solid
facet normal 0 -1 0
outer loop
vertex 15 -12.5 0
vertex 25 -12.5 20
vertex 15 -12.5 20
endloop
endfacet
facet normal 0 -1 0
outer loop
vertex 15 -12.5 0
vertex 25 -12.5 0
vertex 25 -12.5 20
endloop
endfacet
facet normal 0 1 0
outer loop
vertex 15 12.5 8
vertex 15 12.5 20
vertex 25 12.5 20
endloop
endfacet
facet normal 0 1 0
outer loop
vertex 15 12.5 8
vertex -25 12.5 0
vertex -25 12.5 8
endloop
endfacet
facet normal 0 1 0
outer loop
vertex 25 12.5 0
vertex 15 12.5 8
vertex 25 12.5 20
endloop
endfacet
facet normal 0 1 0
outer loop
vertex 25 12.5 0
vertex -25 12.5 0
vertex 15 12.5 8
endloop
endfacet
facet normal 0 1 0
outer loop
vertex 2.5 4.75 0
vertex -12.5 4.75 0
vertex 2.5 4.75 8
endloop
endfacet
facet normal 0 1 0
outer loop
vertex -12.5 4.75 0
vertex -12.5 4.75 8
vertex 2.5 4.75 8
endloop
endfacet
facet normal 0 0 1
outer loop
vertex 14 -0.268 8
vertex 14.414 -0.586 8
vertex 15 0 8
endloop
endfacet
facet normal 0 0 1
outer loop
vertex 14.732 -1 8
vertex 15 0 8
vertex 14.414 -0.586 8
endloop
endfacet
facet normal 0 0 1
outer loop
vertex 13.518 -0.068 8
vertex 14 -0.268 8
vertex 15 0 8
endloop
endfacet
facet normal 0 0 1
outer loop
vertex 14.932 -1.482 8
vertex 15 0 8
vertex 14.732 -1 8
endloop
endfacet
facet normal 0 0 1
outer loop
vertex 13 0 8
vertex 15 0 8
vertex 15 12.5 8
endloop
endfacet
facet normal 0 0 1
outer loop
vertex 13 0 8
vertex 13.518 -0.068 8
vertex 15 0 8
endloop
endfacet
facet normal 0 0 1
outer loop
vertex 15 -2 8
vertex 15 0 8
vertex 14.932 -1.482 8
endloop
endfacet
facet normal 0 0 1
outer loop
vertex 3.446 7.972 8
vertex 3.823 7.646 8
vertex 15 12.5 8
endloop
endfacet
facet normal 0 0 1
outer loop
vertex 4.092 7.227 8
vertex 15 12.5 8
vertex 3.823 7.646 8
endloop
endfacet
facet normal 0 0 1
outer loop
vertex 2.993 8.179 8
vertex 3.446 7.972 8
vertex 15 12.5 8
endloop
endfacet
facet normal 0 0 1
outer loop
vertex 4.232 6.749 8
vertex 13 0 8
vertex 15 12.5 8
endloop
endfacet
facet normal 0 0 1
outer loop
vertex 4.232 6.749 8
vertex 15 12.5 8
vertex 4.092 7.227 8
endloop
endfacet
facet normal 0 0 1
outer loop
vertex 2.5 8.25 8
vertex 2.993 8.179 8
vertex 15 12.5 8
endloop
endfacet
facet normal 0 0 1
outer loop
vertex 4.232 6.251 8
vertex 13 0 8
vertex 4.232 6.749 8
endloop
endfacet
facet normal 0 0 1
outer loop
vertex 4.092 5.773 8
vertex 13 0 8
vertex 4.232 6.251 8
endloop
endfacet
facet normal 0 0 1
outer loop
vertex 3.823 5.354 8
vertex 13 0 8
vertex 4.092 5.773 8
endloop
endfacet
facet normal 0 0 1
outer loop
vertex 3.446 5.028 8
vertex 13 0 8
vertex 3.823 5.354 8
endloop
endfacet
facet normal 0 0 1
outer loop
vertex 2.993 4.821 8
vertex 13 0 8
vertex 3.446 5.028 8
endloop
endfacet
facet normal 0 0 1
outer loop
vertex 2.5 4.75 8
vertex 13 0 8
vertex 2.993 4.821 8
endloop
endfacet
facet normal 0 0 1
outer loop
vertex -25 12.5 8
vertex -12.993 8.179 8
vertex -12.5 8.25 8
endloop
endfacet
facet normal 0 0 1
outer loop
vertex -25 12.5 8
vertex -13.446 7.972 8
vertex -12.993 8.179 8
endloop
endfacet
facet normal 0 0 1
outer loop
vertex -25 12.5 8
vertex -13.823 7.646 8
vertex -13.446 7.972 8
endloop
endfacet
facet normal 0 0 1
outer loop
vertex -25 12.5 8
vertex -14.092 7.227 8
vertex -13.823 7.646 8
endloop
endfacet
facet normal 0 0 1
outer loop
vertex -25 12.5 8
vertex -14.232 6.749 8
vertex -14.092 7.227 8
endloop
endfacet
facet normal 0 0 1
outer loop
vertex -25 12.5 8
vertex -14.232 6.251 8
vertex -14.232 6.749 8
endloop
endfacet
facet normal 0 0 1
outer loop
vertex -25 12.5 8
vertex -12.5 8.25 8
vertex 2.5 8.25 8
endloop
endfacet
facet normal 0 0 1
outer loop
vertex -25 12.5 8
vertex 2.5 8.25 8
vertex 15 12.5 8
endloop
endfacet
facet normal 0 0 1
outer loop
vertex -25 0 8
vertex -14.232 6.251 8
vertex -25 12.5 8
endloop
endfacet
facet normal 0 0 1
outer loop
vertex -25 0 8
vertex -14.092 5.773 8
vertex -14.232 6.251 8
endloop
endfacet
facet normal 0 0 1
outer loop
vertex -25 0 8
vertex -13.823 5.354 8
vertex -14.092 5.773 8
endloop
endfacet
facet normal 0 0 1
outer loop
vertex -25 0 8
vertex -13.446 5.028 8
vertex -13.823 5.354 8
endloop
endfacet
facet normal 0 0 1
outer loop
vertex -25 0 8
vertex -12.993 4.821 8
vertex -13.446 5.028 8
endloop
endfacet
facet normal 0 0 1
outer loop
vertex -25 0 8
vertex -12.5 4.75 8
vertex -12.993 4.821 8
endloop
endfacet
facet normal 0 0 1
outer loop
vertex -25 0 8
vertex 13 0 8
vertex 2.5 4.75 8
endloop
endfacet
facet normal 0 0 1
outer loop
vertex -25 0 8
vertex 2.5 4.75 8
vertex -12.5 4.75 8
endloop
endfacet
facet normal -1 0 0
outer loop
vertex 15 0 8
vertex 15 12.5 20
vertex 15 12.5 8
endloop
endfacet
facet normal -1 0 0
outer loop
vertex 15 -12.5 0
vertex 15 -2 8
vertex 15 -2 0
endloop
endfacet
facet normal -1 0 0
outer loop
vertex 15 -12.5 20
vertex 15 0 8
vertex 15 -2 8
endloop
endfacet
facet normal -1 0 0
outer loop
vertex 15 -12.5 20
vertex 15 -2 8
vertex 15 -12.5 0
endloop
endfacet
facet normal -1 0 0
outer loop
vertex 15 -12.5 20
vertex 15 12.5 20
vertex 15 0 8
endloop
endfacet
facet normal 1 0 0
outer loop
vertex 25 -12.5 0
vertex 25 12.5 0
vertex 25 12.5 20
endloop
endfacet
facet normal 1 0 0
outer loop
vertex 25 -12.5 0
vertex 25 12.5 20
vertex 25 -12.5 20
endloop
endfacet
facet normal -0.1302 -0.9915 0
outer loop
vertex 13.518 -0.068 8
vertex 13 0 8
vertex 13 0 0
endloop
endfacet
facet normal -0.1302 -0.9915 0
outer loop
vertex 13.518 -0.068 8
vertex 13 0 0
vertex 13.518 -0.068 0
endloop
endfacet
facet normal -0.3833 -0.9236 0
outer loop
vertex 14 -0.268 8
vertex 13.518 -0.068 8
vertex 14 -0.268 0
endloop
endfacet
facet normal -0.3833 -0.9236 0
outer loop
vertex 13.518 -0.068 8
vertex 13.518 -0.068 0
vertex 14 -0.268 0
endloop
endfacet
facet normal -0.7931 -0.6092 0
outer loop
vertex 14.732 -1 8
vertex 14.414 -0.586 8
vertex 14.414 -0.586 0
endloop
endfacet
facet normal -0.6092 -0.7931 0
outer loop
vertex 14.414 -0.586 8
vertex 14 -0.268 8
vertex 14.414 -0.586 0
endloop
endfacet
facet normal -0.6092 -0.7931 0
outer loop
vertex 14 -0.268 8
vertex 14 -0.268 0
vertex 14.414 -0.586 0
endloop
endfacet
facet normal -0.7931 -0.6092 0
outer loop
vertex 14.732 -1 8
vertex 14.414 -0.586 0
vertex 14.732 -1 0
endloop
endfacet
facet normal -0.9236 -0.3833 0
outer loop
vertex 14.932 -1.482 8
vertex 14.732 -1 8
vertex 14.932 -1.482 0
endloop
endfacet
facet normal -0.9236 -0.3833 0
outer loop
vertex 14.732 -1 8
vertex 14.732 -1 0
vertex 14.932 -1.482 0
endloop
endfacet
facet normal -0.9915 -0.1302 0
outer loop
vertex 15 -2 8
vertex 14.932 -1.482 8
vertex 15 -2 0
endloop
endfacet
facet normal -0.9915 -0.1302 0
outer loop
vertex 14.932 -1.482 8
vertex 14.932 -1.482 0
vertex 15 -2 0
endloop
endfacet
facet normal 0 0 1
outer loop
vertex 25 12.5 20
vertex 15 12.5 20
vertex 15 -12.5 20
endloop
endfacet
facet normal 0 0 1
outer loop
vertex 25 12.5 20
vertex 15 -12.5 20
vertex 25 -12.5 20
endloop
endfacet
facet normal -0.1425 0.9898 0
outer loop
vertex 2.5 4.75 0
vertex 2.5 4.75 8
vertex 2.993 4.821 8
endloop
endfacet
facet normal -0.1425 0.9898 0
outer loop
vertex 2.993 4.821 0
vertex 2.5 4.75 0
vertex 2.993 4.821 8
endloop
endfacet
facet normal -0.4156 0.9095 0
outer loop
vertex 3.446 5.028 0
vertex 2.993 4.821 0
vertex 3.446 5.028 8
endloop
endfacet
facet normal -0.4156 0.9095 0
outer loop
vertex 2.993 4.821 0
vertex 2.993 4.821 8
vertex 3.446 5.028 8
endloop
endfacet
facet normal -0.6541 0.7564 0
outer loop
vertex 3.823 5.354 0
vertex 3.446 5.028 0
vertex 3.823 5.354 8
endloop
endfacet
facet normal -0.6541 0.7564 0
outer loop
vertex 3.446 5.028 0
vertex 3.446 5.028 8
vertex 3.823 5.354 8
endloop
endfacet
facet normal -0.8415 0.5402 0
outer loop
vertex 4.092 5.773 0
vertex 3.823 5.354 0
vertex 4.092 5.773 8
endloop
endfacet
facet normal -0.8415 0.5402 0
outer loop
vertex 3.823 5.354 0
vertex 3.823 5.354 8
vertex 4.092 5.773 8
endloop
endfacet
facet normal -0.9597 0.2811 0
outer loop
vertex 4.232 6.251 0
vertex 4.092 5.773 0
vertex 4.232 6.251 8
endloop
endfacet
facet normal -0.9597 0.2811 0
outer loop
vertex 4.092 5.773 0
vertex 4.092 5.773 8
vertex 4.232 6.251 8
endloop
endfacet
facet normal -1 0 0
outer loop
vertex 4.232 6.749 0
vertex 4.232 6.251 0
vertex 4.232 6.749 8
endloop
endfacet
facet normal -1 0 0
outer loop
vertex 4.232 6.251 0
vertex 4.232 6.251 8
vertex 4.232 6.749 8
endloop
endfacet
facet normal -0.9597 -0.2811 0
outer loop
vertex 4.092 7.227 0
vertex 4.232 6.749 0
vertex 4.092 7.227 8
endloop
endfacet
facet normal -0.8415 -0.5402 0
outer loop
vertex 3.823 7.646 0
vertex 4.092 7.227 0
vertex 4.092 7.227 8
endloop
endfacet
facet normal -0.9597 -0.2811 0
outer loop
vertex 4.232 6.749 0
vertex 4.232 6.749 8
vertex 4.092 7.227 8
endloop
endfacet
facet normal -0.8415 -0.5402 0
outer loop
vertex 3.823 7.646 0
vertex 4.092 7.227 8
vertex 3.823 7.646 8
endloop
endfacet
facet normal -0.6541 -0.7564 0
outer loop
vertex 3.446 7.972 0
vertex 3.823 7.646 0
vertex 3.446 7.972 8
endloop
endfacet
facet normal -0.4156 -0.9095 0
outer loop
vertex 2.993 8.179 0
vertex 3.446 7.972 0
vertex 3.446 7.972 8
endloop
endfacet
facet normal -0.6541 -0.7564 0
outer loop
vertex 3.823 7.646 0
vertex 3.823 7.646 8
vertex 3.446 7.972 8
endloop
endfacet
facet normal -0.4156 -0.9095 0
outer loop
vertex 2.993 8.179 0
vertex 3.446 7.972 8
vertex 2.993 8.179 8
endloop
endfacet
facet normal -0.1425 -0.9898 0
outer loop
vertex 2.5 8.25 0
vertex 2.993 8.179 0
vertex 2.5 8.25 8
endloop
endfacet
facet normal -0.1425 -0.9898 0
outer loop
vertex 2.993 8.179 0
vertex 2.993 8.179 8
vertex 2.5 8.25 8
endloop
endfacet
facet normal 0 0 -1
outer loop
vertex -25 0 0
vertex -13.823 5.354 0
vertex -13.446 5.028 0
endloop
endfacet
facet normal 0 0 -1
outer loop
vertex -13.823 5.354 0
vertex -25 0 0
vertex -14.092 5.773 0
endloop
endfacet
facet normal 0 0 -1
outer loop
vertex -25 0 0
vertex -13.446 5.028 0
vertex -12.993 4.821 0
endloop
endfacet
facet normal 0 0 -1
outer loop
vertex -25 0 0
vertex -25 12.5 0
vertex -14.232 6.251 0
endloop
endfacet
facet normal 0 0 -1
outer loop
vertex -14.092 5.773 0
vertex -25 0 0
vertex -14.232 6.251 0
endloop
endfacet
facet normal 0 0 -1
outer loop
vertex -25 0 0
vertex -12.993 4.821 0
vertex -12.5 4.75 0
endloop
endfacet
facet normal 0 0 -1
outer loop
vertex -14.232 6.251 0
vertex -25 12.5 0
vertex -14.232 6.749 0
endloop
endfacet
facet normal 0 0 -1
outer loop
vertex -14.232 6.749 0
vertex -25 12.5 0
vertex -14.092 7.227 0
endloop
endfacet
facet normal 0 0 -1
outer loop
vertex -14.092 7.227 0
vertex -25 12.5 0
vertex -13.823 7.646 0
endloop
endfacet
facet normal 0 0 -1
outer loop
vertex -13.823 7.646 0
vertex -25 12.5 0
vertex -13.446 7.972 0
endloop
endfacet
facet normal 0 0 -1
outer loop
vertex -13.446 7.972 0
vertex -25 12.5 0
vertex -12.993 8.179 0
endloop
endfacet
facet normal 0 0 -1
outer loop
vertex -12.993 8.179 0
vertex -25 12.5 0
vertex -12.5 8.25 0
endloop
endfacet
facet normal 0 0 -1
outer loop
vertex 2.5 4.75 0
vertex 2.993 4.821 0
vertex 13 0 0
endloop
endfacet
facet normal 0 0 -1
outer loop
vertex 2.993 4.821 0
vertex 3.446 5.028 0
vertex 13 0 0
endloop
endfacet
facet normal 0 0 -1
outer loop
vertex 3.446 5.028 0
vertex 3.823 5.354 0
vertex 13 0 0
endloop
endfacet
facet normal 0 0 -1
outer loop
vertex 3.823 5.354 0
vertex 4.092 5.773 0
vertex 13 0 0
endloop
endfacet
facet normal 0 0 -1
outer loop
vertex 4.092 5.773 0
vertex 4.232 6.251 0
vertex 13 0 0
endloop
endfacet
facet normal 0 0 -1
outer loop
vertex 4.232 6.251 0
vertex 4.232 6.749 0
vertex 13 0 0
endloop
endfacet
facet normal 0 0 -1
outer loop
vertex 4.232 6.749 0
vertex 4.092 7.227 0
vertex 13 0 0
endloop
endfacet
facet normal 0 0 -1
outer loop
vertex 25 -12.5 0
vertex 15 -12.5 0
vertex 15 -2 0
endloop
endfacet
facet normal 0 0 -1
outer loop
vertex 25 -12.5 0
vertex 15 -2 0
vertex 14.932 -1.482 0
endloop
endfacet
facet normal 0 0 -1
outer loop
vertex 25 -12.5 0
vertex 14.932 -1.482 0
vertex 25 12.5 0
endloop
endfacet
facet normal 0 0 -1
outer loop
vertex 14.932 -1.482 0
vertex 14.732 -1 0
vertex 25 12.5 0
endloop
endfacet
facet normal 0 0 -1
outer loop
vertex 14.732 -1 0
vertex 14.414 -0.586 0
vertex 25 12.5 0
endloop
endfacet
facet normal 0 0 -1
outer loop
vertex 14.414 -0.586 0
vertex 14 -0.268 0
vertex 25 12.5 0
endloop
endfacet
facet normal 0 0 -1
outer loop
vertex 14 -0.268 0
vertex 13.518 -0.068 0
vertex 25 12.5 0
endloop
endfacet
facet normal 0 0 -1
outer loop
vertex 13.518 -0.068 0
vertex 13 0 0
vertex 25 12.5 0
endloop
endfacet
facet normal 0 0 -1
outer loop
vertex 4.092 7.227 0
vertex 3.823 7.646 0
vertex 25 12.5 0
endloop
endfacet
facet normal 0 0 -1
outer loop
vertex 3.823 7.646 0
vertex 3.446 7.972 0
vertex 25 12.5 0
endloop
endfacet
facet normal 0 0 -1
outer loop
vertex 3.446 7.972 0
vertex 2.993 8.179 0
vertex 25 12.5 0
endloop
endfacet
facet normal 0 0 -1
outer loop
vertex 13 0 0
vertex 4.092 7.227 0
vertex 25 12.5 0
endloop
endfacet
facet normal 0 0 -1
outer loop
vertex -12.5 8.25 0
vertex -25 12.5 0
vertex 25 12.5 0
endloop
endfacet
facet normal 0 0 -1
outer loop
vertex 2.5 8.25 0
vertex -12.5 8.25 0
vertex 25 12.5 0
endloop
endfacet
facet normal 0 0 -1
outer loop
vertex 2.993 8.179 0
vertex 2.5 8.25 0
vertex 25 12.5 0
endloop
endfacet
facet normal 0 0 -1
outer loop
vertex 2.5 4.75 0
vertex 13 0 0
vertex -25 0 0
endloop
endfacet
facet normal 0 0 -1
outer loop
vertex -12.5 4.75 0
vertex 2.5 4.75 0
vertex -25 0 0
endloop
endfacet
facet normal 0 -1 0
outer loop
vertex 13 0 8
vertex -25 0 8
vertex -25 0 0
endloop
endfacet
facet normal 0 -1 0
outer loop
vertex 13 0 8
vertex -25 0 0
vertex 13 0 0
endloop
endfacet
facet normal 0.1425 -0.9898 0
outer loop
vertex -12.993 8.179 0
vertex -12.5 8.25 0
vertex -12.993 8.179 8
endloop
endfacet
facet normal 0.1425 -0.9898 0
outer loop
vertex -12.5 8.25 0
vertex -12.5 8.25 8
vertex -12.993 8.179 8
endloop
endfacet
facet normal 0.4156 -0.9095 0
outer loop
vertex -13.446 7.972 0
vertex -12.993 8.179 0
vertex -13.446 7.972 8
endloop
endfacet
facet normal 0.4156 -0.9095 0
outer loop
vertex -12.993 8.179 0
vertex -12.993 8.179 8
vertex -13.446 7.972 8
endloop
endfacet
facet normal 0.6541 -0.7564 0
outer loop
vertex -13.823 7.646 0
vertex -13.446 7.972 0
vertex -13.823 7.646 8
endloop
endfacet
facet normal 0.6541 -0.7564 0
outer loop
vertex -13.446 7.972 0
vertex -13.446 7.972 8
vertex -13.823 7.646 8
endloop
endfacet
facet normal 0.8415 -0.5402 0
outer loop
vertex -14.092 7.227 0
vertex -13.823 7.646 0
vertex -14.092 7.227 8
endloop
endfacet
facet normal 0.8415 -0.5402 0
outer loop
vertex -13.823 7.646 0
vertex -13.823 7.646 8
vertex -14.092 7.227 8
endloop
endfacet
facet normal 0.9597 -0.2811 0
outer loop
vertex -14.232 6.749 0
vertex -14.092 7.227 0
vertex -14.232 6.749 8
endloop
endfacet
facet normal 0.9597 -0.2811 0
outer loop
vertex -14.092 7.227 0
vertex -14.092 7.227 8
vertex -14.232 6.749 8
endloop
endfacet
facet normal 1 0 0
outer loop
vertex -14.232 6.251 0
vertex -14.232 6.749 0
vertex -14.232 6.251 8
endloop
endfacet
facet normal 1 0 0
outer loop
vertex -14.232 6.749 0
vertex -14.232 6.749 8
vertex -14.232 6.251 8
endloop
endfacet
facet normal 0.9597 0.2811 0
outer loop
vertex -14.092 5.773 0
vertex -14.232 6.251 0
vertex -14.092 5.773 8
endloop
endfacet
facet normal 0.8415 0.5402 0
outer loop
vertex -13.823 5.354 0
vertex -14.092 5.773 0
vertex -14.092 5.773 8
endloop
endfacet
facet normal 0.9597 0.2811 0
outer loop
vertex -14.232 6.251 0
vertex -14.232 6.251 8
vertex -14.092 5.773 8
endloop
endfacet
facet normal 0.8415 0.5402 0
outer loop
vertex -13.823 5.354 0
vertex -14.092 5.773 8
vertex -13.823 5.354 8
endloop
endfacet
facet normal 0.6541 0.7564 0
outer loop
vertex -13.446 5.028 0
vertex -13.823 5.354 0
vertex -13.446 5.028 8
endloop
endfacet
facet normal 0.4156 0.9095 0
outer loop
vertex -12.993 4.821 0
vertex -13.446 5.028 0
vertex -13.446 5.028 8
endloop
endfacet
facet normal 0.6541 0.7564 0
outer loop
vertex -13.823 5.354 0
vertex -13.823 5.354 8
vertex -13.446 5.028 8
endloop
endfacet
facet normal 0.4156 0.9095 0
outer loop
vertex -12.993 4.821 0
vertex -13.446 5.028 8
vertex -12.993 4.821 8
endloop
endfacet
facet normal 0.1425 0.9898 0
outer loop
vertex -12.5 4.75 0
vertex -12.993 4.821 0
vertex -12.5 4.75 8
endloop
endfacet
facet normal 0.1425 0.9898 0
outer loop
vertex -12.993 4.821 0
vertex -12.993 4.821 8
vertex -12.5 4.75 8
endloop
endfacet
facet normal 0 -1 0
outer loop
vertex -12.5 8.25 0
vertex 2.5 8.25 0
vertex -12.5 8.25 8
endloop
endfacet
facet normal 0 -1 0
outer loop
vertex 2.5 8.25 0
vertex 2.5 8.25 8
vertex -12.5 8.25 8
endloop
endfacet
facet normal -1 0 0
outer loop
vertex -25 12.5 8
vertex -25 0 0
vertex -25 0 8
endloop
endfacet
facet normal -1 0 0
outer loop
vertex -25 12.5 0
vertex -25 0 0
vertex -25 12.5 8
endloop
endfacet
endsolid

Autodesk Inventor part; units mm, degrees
ref_plane "YZ Plane" through (0, 0, 0) normal (1, 0, 0) x (0, 1, 0)
ref_plane "XZ Plane" through (0, 0, 0) normal (0, 1, 0) x (-1, 0, 0)
ref_plane "XY Plane" through (0, 0, 0) normal (0, 0, 1) x (1, 0, 0)
sketch "Sketch1" plane through (0, 0, 0) normal (0, 0, 1) x (1, 0, 0)
  line L0 (-25, 12.5) -> (25, 12.5)
  line L1 (25, 12.5) -> (25, -12.5)
  line L2 (25, -12.5) -> (-25, -12.5)
  line L3 (-25, -12.5) -> (-25, 12.5)
  point P0 (0, 0)
  point P1 (0, 12.5)
  point P2 (-25, 0)
  dimension "d0" = 50
  dimension "d1" = 25
extrude "Extrusion1" add sketch "Sketch1" along normal blind 20
sketch "Sketch5" plane through (0, 0, 20) normal (0, 0, 1) x (1, 0, 0)
  line L0 (2.5, 8.5) -> (-12.5, 8.5) construction
  line L1 (2.5, 10.25) -> (-12.5, 10.25)
  line L2 (-12.5, 6.75) -> (2.5, 6.75)
  arc A0 (2.5, 6.75) -> (2.5, 10.25) centre (2.5, 8.5) ccw
  arc A1 (-12.5, 10.25) -> (-12.5, 6.75) centre (-12.5, 8.5) ccw
  line L3 (2.5, -6.5) -> (-12.5, -6.5) construction
  line L4 (2.5, -4.75) -> (-12.5, -4.75)
  line L5 (-12.5, -8.25) -> (2.5, -8.25)
  arc A2 (2.5, -8.25) -> (2.5, -4.75) centre (2.5, -6.5) ccw
  arc A3 (-12.5, -4.75) -> (-12.5, -8.25) centre (-12.5, -6.5) ccw
  line L6 (25, 12.5) -> (-25, 12.5) projected
  line L7 (-25, -12.5) -> (25, -12.5) projected
  line L8 (-25, 12.5) -> (-25, -12.5) projected
  point P0 (0, 0)
  point P1 (-5, 8.5)
  point P2 (-5, -6.5)
  dimension "d29" = 3.5
  dimension "d30" = 4
  dimension "d31" = 6
  dimension "d32" = 20
  dimension "d33" = 15
extrude "Extrusion5" cut sketch "Sketch5" against normal through all contours A2 L5 A3 L4
sketch "Sketch6" plane through (0, 0, 20) normal (0, 0, 1) x (1, 0, 0)
  line L0 (15, 0) -> (-25, 0)
  line L1 (-25, 0) -> (-25, 12.5)
  line L2 (-25, 12.5) -> (15, 12.5)
  line L3 (15, 12.5) -> (15, 0)
  line L4 (25, -12.5) -> (25, 12.5) projected
  line L5 (-25, 12.5) -> (-25, -12.5) projected
  line L6 (25, 12.5) -> (-25, 12.5) projected
  point P0 (0, 0)
  dimension "d36" = 10
extrude "Extrusion6" cut sketch "Sketch6" against normal through all
sketch "Sketch7" plane through (0, 0, 20) normal (0, 0, 1) x (1, 0, 0)
  line L0 (15, -12.5) -> (-25, -12.5)
  line L1 (-25, -12.5) -> (-25, 0)
  line L2 (-25, 0) -> (15, 0)
  line L3 (15, 0) -> (15, -12.5)
  line L4 (15, 12.5) -> (15, 0) projected
  line L5 (-25, -12.5) -> (25, -12.5) projected
  line L6 (-25, 0) -> (-25, -12.5) projected
  line L7 (15, 0) -> (-25, 0) projected
  point P0 (0, 0)
  point P1 (15, 2)
  point P2 (13, 0)
extrude "Extrusion7" cut sketch "Sketch7" against normal blind 12
fillet "Fillet2" radius 2 1 edges at (15, 0, 4)
mirror "Mirror1" about plane through (0, 0, 0) normal (0, 1, 0) of "Extrusion1", "Extrusion5", "Extrusion6", "Extrusion7", "Fillet2"
properties part number "0005-10-030 Activator senzor x"
